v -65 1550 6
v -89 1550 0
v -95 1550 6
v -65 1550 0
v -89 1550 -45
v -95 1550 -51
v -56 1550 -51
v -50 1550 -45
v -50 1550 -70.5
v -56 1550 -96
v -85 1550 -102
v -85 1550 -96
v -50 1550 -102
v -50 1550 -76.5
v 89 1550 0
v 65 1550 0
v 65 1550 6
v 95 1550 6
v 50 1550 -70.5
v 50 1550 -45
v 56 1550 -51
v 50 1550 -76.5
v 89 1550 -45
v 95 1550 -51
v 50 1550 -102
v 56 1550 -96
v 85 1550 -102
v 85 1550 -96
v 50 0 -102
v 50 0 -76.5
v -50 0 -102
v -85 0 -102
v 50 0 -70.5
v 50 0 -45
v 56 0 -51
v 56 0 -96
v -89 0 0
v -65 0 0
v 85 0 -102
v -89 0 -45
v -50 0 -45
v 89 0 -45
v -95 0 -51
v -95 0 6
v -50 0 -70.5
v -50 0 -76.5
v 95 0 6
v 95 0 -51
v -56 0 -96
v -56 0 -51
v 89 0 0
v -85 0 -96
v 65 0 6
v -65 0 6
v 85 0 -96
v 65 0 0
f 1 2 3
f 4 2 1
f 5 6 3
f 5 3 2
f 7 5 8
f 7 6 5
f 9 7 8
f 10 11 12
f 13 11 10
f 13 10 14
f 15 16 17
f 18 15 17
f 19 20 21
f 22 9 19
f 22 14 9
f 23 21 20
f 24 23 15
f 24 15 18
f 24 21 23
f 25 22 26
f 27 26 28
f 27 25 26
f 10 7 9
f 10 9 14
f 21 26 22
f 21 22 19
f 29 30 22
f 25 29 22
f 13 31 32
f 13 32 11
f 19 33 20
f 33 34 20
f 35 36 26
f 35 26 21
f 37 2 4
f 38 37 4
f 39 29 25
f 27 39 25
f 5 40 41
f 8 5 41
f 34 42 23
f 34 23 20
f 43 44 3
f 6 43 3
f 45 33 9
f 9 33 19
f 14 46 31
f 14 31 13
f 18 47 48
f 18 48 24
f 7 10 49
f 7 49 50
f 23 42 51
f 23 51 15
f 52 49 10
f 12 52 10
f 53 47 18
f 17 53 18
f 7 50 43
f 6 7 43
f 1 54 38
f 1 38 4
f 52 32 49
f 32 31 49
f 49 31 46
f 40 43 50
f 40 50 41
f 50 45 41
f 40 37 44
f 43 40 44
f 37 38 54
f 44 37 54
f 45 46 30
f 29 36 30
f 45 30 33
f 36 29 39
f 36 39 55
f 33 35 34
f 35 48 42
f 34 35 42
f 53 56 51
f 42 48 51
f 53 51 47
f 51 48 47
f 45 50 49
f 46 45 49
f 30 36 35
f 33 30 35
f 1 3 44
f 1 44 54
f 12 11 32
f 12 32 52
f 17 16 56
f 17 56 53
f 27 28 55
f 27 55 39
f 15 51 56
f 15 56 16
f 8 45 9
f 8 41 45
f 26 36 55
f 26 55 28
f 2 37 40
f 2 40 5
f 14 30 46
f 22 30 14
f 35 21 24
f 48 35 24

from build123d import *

# Parameters (mm, degrees)
SKETCH1_W                      = 45
SKETCH1_H                      = 2350
BOSS_EXTRUDE1_DEPTH            = 31.5
SKETCH2_W                      = 6
SKETCH2_H                      = 2350
BOSS_EXTRUDE2_DEPTH            = 145
SKETCH3_W                      = 45
SKETCH3_H                      = 2350
BOSS_EXTRUDE3_DEPTH            = 76.5
SKETCH4_W                      = 6
SKETCH4_H                      = 2350
BOSS_EXTRUDE4_DEPTH            = 51
SKETCH5_W                      = 6
SKETCH5_H                      = 2350
BOSS_EXTRUDE5_DEPTH            = 24
SKETCH6_W                      = 15
SKETCH6_H                      = 2350
CUT_EXTRUDE1_DEPTH             = 6
SKETCH7_W                      = 39
SKETCH7_H                      = 2350
CUT_EXTRUDE2_DEPTH             = 45
SKETCH8_W                      = 100
SKETCH8_H                      = 6
CUT_EXTRUDE3_DEPTH             = 100
SKETCH9_W                      = 45
SKETCH9_H                      = 2350
BOSS_EXTRUDE6_DEPTH            = 25.5
SKETCH10_W                     = 39
SKETCH10_H                     = 51
CUT_EXTRUDE4_DEPTH             = 2351
SKETCH11_W                     = 6
SKETCH11_H                     = 2350
BOSS_EXTRUDE7_DEPTH            = 29
SKETCH12_W                     = 45
SKETCH12_H                     = 2350
BOSS_EXTRUDE8_DEPTH            = 25.5
SKETCH13_W                     = 39
SKETCH13_H                     = 51
CUT_EXTRUDE5_DEPTH             = 2351
SKETCH14_W                     = 6
SKETCH14_H                     = 2350
BOSS_EXTRUDE9_DEPTH            = 29
F_10_0_10_DIAMETER_HOLE1_D     = 10
F_10_0_10_DIAMETER_HOLE1_DEPTH = 6
F_10_0_10_DIAMETER_HOLE2_D     = 10
F_10_0_10_DIAMETER_HOLE2_DEPTH = 45
SKETCH24_W                     = 287.862467109
SKETCH24_H                     = 163.242221956
CUT_EXTRUDE8_DEPTH             = 800


with BuildPart() as part:
    # Sketch1 → Boss-Extrude1 (new body)
    with BuildSketch(Plane(origin=(0, 0, -76.5), x_dir=(-1, 0, 0), z_dir=(0, 0, -1))):
        with Locations((-72.5, 1175)):
            Rectangle(SKETCH1_W, SKETCH1_H)
    extrude(amount=-BOSS_EXTRUDE1_DEPTH)

    # Sketch2 → Boss-Extrude2 (add)
    with BuildSketch(Plane.ZY.offset(-50)):
        with Locations((-73.5, 1175)):
            Rectangle(SKETCH2_W, SKETCH2_H)
    extrude(amount=BOSS_EXTRUDE2_DEPTH)

    # Sketch3 → Boss-Extrude3 (add)
    with BuildSketch(Plane.XY.offset(-70.5)):
        with Locations((-72.5, 1175)):
            Rectangle(SKETCH3_W, SKETCH3_H)
    extrude(amount=BOSS_EXTRUDE3_DEPTH)

    # Sketch4 → Boss-Extrude4 (add)
    with BuildSketch(Plane.XY.offset(-45)):
        with Locations((92, 1175)):
            Rectangle(SKETCH4_W, SKETCH4_H)
    extrude(amount=BOSS_EXTRUDE4_DEPTH)

    # Sketch5 → Boss-Extrude5 (add)
    with BuildSketch(Plane.ZY.offset(-89)):
        with Locations((3, 1175)):
            Rectangle(SKETCH5_W, SKETCH5_H)
    extrude(amount=BOSS_EXTRUDE5_DEPTH)

    # Sketch6 → Cut-Extrude1 (cut)
    with BuildSketch(Plane.XY.offset(6)):
        with Locations((-57.5, 1175)):
            Rectangle(SKETCH6_W, SKETCH6_H)
    extrude(amount=-CUT_EXTRUDE1_DEPTH, mode=Mode.SUBTRACT)

    # Sketch7 → Cut-Extrude2 (cut)
    with BuildSketch(Plane.XY):
        with Locations((-69.5, 1175)):
            Rectangle(SKETCH7_W, SKETCH7_H)
    extrude(amount=-CUT_EXTRUDE2_DEPTH, mode=Mode.SUBTRACT)

    # Sketch8 → Cut-Extrude3 (cut)
    with BuildSketch(Plane(origin=(0, 2350, 0), x_dir=(-1, 0, 0), z_dir=(0, 1, 0))):
        with Locations((0, -73.5)):
            Rectangle(SKETCH8_W, SKETCH8_H)
    extrude(amount=-CUT_EXTRUDE3_DEPTH, mode=Mode.SUBTRACT)

    # Sketch9 → Boss-Extrude6 (add)
    with BuildSketch(Plane(origin=(0, 0, -76.5), x_dir=(-1, 0, 0), z_dir=(0, 0, -1))):
        with Locations((-72.5, 1175)):
            Rectangle(SKETCH9_W, SKETCH9_H)
    extrude(amount=BOSS_EXTRUDE6_DEPTH)

    # Sketch10 → Cut-Extrude4 (cut, through all)
    with BuildSketch(Plane.XZ):
        with Locations((75.5, -76.5)):
            Rectangle(SKETCH10_W, SKETCH10_H)
    extrude(amount=-CUT_EXTRUDE4_DEPTH, mode=Mode.SUBTRACT)

    # Sketch11 → Boss-Extrude7 (add)
    with BuildSketch(Plane(origin=(56, 0, 0), x_dir=(0, 0, -1), z_dir=(1, 0, 0))):
        with Locations((99, 1175)):
            Rectangle(SKETCH11_W, SKETCH11_H)
    extrude(amount=BOSS_EXTRUDE7_DEPTH)

    # Sketch12 → Boss-Extrude8 (add)
    with BuildSketch(Plane(origin=(0, 0, -76.5), x_dir=(-1, 0, 0), z_dir=(0, 0, -1))):
        with Locations((72.5, 1175)):
            Rectangle(SKETCH12_W, SKETCH12_H)
    extrude(amount=BOSS_EXTRUDE8_DEPTH)

    # Sketch13 → Cut-Extrude5 (cut, through all)
    with BuildSketch(Plane(origin=(0, 2350, 0), x_dir=(-1, 0, 0), z_dir=(0, 1, 0))):
        with Locations((75.5, -76.5)):
            Rectangle(SKETCH13_W, SKETCH13_H)
    extrude(amount=-CUT_EXTRUDE5_DEPTH, mode=Mode.SUBTRACT)

    # Sketch14 → Boss-Extrude9 (add)
    with BuildSketch(Plane.ZY.offset(56)):
        with Locations((-99, 1175)):
            Rectangle(SKETCH14_W, SKETCH14_H)
    extrude(amount=BOSS_EXTRUDE9_DEPTH)

    # Ø10.0 (10) Diameter Hole1
    with Locations(Plane.ZY.offset(56)):
        with Locations((-73.5, 2330)):
            Hole(F_10_0_10_DIAMETER_HOLE1_D / 2, depth=F_10_0_10_DIAMETER_HOLE1_DEPTH)

    # Ø10.0 (10) Diameter Hole2
    with Locations(Plane.ZY.offset(-50)):
        with Locations((-73.5, 2330)):
            Hole(F_10_0_10_DIAMETER_HOLE2_D / 2, depth=F_10_0_10_DIAMETER_HOLE2_DEPTH)

    # Sketch24 → Cut-Extrude8 (cut)
    with BuildSketch(Plane(origin=(0, 2350, 0), x_dir=(1, 0, 0), z_dir=(0, 1, 0))):
        with Locations((3.257138833, 40.584576945)):
            Rectangle(SKETCH24_W, SKETCH24_H)
    extrude(amount=-CUT_EXTRUDE8_DEPTH, mode=Mode.SUBTRACT)


solid = part.part
